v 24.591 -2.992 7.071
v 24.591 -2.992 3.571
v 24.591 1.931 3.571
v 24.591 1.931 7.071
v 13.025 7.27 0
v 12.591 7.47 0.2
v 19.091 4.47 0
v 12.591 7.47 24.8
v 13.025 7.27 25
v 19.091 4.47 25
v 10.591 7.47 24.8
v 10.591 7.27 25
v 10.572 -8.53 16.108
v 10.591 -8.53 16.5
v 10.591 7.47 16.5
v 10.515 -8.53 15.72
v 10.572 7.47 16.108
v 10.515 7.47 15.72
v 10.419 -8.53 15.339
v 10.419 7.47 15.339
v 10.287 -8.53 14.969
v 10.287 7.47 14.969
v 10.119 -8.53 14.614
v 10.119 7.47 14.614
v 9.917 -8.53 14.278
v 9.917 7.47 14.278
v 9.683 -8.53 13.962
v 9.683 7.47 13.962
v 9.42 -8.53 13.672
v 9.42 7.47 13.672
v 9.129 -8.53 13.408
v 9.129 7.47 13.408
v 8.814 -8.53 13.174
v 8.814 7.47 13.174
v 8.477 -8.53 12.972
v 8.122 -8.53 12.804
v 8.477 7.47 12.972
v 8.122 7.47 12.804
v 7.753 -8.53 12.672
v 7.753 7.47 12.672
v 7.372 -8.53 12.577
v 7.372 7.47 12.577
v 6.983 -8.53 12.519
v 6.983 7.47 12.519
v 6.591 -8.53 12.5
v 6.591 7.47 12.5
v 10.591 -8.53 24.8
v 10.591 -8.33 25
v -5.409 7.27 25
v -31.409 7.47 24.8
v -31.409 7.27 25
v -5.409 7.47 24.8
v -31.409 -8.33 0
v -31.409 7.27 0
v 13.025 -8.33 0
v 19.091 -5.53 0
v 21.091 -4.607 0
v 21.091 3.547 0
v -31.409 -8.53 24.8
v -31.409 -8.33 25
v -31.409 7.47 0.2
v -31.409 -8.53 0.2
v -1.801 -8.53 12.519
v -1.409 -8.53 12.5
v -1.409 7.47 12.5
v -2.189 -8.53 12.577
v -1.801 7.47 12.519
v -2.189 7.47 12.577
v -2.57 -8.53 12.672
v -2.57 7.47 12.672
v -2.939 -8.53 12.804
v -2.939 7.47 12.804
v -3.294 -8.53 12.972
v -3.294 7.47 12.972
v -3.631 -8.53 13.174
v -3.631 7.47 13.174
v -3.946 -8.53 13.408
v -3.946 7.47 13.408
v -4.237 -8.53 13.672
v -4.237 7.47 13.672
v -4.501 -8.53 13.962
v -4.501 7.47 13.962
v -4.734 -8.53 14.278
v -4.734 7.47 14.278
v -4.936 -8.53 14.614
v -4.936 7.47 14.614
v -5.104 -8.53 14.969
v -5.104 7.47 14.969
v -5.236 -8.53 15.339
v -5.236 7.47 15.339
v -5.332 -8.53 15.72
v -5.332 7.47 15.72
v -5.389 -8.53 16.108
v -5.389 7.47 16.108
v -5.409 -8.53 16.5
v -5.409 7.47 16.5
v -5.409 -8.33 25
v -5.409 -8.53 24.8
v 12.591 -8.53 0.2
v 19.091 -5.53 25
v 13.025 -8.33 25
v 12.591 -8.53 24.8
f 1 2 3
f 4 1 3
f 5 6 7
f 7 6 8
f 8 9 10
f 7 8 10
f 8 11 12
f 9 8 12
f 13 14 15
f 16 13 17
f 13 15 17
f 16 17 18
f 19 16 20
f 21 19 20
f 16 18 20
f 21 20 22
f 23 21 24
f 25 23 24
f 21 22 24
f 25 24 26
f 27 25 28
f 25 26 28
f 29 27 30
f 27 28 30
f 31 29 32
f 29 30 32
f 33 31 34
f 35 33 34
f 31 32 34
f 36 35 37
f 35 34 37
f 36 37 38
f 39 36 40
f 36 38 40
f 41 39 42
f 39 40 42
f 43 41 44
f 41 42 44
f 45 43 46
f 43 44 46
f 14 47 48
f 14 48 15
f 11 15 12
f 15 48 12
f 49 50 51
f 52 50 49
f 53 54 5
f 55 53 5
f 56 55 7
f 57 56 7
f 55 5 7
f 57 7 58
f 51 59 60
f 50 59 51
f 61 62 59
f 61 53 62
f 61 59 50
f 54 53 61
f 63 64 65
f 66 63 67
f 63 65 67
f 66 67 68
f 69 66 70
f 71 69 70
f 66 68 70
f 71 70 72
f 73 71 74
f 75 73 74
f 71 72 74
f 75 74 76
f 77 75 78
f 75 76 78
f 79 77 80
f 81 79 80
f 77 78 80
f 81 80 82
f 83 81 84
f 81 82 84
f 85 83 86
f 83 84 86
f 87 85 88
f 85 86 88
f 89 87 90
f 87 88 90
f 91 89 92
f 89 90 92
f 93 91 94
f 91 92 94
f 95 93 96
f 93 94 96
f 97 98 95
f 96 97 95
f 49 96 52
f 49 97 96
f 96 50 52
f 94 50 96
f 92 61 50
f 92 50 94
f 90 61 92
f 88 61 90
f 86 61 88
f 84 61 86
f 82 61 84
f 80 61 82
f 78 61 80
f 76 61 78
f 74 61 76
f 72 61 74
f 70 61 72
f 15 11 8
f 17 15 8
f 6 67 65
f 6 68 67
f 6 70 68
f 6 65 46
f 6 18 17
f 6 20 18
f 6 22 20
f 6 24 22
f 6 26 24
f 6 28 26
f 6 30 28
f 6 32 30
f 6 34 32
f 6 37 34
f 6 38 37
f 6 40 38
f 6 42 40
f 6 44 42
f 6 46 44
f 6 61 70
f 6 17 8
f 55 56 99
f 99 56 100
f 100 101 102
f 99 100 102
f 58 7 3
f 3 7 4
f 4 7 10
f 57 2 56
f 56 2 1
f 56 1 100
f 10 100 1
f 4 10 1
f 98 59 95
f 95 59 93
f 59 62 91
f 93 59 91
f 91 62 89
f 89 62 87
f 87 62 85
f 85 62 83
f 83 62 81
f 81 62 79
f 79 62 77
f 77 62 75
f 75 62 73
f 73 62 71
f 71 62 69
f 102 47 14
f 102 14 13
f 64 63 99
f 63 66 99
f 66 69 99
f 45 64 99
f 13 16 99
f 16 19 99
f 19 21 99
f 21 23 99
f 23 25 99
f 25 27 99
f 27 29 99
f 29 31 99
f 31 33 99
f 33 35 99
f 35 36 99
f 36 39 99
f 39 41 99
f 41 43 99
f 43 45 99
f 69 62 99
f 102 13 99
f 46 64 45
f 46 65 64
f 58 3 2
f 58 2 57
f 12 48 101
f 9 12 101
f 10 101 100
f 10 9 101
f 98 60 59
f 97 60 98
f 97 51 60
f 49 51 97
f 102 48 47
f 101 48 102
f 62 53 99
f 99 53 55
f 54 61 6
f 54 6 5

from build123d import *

# Parameters (mm, degrees)
F0_W     = 56
F0_H     = 16
F1_DEPTH = 25
F2_W     = 16
F2_H     = 16
F3_DEPTH = 12.5
F4_R     = 4
F7_DEPTH = 25
F8_DEPTH = 25
F9_SIZE  = 0.2


with BuildPart() as f1:
    # F0 (on Top) → F1 (new body)
    with BuildSketch(Plane.XY):
        with Locations((-3.4085810184, -0.5300787467)):
            Rectangle(F0_W, F0_H)
    extrude(amount=F1_DEPTH)

    # F2 (on face) → F3 (cut)
    with BuildSketch(Plane.XY.offset(25)):
        with Locations((2.5914189816, -0.5300787467)):
            Rectangle(F2_W, F2_H)
    extrude(amount=-F3_DEPTH, mode=Mode.SUBTRACT)

    # F4
    f4_edges = [f1.edges().sort_by_distance(p)[0] for p in [
        (10.591419, -0.530079, 12.5),
        (-5.408581, -0.530079, 12.5),
    ]]
    fillet(f4_edges, radius=F4_R)

    # F6 (on face) → F7 (cut)
    with BuildSketch(Plane.XZ.offset(8.5300787467)):
        Polygon((24.5914189816, 25), (19.0914189816, 25), (24.5914189816, 7.0707142143), align=None)
        Polygon((24.5914189816, 0), (24.5914189816, 3.5707142143), (21.0914189816, 0), align=None)
    extrude(amount=-F7_DEPTH, mode=Mode.SUBTRACT)

    # F5 (on face) → F8 (cut)
    with BuildSketch(Plane.XY.offset(25)):
        Polygon((19.0914189816, 7.4699212533), (12.5914189816, 7.4699212533), (19.0914189816, 4.4699212533), align=None)
        Polygon((19.0914189816, -5.5300787467), (12.5914189816, -8.5300787467), (19.0914189816, -8.5300787467), align=None)
        Polygon((19.0914189816, 7.4699212533), (19.0914189816, 4.4699212533), (24.5914189816, 1.9314597149), (24.5914189816, 7.4699212533), align=None)
        Polygon((24.5914189816, -8.5300787467), (24.5914189816, -2.9916172082), (19.0914189816, -5.5300787467), (19.0914189816, -8.5300787467), align=None)
    extrude(amount=-F8_DEPTH, mode=Mode.SUBTRACT)

    # F9
    f9_edges = [f1.edges().sort_by_distance(p)[0] for p in [
        (-18.408581, -8.530079, 25),
        (-18.408581, 7.469921, 25),
        (11.591419, 7.469921, 25),
        (11.591419, -8.530079, 25),
        (-9.408581, -8.530079, 0),
        (-9.408581, 7.469921, 0),
    ]]
    chamfer(f9_edges, length=F9_SIZE)


solid = f1.part
